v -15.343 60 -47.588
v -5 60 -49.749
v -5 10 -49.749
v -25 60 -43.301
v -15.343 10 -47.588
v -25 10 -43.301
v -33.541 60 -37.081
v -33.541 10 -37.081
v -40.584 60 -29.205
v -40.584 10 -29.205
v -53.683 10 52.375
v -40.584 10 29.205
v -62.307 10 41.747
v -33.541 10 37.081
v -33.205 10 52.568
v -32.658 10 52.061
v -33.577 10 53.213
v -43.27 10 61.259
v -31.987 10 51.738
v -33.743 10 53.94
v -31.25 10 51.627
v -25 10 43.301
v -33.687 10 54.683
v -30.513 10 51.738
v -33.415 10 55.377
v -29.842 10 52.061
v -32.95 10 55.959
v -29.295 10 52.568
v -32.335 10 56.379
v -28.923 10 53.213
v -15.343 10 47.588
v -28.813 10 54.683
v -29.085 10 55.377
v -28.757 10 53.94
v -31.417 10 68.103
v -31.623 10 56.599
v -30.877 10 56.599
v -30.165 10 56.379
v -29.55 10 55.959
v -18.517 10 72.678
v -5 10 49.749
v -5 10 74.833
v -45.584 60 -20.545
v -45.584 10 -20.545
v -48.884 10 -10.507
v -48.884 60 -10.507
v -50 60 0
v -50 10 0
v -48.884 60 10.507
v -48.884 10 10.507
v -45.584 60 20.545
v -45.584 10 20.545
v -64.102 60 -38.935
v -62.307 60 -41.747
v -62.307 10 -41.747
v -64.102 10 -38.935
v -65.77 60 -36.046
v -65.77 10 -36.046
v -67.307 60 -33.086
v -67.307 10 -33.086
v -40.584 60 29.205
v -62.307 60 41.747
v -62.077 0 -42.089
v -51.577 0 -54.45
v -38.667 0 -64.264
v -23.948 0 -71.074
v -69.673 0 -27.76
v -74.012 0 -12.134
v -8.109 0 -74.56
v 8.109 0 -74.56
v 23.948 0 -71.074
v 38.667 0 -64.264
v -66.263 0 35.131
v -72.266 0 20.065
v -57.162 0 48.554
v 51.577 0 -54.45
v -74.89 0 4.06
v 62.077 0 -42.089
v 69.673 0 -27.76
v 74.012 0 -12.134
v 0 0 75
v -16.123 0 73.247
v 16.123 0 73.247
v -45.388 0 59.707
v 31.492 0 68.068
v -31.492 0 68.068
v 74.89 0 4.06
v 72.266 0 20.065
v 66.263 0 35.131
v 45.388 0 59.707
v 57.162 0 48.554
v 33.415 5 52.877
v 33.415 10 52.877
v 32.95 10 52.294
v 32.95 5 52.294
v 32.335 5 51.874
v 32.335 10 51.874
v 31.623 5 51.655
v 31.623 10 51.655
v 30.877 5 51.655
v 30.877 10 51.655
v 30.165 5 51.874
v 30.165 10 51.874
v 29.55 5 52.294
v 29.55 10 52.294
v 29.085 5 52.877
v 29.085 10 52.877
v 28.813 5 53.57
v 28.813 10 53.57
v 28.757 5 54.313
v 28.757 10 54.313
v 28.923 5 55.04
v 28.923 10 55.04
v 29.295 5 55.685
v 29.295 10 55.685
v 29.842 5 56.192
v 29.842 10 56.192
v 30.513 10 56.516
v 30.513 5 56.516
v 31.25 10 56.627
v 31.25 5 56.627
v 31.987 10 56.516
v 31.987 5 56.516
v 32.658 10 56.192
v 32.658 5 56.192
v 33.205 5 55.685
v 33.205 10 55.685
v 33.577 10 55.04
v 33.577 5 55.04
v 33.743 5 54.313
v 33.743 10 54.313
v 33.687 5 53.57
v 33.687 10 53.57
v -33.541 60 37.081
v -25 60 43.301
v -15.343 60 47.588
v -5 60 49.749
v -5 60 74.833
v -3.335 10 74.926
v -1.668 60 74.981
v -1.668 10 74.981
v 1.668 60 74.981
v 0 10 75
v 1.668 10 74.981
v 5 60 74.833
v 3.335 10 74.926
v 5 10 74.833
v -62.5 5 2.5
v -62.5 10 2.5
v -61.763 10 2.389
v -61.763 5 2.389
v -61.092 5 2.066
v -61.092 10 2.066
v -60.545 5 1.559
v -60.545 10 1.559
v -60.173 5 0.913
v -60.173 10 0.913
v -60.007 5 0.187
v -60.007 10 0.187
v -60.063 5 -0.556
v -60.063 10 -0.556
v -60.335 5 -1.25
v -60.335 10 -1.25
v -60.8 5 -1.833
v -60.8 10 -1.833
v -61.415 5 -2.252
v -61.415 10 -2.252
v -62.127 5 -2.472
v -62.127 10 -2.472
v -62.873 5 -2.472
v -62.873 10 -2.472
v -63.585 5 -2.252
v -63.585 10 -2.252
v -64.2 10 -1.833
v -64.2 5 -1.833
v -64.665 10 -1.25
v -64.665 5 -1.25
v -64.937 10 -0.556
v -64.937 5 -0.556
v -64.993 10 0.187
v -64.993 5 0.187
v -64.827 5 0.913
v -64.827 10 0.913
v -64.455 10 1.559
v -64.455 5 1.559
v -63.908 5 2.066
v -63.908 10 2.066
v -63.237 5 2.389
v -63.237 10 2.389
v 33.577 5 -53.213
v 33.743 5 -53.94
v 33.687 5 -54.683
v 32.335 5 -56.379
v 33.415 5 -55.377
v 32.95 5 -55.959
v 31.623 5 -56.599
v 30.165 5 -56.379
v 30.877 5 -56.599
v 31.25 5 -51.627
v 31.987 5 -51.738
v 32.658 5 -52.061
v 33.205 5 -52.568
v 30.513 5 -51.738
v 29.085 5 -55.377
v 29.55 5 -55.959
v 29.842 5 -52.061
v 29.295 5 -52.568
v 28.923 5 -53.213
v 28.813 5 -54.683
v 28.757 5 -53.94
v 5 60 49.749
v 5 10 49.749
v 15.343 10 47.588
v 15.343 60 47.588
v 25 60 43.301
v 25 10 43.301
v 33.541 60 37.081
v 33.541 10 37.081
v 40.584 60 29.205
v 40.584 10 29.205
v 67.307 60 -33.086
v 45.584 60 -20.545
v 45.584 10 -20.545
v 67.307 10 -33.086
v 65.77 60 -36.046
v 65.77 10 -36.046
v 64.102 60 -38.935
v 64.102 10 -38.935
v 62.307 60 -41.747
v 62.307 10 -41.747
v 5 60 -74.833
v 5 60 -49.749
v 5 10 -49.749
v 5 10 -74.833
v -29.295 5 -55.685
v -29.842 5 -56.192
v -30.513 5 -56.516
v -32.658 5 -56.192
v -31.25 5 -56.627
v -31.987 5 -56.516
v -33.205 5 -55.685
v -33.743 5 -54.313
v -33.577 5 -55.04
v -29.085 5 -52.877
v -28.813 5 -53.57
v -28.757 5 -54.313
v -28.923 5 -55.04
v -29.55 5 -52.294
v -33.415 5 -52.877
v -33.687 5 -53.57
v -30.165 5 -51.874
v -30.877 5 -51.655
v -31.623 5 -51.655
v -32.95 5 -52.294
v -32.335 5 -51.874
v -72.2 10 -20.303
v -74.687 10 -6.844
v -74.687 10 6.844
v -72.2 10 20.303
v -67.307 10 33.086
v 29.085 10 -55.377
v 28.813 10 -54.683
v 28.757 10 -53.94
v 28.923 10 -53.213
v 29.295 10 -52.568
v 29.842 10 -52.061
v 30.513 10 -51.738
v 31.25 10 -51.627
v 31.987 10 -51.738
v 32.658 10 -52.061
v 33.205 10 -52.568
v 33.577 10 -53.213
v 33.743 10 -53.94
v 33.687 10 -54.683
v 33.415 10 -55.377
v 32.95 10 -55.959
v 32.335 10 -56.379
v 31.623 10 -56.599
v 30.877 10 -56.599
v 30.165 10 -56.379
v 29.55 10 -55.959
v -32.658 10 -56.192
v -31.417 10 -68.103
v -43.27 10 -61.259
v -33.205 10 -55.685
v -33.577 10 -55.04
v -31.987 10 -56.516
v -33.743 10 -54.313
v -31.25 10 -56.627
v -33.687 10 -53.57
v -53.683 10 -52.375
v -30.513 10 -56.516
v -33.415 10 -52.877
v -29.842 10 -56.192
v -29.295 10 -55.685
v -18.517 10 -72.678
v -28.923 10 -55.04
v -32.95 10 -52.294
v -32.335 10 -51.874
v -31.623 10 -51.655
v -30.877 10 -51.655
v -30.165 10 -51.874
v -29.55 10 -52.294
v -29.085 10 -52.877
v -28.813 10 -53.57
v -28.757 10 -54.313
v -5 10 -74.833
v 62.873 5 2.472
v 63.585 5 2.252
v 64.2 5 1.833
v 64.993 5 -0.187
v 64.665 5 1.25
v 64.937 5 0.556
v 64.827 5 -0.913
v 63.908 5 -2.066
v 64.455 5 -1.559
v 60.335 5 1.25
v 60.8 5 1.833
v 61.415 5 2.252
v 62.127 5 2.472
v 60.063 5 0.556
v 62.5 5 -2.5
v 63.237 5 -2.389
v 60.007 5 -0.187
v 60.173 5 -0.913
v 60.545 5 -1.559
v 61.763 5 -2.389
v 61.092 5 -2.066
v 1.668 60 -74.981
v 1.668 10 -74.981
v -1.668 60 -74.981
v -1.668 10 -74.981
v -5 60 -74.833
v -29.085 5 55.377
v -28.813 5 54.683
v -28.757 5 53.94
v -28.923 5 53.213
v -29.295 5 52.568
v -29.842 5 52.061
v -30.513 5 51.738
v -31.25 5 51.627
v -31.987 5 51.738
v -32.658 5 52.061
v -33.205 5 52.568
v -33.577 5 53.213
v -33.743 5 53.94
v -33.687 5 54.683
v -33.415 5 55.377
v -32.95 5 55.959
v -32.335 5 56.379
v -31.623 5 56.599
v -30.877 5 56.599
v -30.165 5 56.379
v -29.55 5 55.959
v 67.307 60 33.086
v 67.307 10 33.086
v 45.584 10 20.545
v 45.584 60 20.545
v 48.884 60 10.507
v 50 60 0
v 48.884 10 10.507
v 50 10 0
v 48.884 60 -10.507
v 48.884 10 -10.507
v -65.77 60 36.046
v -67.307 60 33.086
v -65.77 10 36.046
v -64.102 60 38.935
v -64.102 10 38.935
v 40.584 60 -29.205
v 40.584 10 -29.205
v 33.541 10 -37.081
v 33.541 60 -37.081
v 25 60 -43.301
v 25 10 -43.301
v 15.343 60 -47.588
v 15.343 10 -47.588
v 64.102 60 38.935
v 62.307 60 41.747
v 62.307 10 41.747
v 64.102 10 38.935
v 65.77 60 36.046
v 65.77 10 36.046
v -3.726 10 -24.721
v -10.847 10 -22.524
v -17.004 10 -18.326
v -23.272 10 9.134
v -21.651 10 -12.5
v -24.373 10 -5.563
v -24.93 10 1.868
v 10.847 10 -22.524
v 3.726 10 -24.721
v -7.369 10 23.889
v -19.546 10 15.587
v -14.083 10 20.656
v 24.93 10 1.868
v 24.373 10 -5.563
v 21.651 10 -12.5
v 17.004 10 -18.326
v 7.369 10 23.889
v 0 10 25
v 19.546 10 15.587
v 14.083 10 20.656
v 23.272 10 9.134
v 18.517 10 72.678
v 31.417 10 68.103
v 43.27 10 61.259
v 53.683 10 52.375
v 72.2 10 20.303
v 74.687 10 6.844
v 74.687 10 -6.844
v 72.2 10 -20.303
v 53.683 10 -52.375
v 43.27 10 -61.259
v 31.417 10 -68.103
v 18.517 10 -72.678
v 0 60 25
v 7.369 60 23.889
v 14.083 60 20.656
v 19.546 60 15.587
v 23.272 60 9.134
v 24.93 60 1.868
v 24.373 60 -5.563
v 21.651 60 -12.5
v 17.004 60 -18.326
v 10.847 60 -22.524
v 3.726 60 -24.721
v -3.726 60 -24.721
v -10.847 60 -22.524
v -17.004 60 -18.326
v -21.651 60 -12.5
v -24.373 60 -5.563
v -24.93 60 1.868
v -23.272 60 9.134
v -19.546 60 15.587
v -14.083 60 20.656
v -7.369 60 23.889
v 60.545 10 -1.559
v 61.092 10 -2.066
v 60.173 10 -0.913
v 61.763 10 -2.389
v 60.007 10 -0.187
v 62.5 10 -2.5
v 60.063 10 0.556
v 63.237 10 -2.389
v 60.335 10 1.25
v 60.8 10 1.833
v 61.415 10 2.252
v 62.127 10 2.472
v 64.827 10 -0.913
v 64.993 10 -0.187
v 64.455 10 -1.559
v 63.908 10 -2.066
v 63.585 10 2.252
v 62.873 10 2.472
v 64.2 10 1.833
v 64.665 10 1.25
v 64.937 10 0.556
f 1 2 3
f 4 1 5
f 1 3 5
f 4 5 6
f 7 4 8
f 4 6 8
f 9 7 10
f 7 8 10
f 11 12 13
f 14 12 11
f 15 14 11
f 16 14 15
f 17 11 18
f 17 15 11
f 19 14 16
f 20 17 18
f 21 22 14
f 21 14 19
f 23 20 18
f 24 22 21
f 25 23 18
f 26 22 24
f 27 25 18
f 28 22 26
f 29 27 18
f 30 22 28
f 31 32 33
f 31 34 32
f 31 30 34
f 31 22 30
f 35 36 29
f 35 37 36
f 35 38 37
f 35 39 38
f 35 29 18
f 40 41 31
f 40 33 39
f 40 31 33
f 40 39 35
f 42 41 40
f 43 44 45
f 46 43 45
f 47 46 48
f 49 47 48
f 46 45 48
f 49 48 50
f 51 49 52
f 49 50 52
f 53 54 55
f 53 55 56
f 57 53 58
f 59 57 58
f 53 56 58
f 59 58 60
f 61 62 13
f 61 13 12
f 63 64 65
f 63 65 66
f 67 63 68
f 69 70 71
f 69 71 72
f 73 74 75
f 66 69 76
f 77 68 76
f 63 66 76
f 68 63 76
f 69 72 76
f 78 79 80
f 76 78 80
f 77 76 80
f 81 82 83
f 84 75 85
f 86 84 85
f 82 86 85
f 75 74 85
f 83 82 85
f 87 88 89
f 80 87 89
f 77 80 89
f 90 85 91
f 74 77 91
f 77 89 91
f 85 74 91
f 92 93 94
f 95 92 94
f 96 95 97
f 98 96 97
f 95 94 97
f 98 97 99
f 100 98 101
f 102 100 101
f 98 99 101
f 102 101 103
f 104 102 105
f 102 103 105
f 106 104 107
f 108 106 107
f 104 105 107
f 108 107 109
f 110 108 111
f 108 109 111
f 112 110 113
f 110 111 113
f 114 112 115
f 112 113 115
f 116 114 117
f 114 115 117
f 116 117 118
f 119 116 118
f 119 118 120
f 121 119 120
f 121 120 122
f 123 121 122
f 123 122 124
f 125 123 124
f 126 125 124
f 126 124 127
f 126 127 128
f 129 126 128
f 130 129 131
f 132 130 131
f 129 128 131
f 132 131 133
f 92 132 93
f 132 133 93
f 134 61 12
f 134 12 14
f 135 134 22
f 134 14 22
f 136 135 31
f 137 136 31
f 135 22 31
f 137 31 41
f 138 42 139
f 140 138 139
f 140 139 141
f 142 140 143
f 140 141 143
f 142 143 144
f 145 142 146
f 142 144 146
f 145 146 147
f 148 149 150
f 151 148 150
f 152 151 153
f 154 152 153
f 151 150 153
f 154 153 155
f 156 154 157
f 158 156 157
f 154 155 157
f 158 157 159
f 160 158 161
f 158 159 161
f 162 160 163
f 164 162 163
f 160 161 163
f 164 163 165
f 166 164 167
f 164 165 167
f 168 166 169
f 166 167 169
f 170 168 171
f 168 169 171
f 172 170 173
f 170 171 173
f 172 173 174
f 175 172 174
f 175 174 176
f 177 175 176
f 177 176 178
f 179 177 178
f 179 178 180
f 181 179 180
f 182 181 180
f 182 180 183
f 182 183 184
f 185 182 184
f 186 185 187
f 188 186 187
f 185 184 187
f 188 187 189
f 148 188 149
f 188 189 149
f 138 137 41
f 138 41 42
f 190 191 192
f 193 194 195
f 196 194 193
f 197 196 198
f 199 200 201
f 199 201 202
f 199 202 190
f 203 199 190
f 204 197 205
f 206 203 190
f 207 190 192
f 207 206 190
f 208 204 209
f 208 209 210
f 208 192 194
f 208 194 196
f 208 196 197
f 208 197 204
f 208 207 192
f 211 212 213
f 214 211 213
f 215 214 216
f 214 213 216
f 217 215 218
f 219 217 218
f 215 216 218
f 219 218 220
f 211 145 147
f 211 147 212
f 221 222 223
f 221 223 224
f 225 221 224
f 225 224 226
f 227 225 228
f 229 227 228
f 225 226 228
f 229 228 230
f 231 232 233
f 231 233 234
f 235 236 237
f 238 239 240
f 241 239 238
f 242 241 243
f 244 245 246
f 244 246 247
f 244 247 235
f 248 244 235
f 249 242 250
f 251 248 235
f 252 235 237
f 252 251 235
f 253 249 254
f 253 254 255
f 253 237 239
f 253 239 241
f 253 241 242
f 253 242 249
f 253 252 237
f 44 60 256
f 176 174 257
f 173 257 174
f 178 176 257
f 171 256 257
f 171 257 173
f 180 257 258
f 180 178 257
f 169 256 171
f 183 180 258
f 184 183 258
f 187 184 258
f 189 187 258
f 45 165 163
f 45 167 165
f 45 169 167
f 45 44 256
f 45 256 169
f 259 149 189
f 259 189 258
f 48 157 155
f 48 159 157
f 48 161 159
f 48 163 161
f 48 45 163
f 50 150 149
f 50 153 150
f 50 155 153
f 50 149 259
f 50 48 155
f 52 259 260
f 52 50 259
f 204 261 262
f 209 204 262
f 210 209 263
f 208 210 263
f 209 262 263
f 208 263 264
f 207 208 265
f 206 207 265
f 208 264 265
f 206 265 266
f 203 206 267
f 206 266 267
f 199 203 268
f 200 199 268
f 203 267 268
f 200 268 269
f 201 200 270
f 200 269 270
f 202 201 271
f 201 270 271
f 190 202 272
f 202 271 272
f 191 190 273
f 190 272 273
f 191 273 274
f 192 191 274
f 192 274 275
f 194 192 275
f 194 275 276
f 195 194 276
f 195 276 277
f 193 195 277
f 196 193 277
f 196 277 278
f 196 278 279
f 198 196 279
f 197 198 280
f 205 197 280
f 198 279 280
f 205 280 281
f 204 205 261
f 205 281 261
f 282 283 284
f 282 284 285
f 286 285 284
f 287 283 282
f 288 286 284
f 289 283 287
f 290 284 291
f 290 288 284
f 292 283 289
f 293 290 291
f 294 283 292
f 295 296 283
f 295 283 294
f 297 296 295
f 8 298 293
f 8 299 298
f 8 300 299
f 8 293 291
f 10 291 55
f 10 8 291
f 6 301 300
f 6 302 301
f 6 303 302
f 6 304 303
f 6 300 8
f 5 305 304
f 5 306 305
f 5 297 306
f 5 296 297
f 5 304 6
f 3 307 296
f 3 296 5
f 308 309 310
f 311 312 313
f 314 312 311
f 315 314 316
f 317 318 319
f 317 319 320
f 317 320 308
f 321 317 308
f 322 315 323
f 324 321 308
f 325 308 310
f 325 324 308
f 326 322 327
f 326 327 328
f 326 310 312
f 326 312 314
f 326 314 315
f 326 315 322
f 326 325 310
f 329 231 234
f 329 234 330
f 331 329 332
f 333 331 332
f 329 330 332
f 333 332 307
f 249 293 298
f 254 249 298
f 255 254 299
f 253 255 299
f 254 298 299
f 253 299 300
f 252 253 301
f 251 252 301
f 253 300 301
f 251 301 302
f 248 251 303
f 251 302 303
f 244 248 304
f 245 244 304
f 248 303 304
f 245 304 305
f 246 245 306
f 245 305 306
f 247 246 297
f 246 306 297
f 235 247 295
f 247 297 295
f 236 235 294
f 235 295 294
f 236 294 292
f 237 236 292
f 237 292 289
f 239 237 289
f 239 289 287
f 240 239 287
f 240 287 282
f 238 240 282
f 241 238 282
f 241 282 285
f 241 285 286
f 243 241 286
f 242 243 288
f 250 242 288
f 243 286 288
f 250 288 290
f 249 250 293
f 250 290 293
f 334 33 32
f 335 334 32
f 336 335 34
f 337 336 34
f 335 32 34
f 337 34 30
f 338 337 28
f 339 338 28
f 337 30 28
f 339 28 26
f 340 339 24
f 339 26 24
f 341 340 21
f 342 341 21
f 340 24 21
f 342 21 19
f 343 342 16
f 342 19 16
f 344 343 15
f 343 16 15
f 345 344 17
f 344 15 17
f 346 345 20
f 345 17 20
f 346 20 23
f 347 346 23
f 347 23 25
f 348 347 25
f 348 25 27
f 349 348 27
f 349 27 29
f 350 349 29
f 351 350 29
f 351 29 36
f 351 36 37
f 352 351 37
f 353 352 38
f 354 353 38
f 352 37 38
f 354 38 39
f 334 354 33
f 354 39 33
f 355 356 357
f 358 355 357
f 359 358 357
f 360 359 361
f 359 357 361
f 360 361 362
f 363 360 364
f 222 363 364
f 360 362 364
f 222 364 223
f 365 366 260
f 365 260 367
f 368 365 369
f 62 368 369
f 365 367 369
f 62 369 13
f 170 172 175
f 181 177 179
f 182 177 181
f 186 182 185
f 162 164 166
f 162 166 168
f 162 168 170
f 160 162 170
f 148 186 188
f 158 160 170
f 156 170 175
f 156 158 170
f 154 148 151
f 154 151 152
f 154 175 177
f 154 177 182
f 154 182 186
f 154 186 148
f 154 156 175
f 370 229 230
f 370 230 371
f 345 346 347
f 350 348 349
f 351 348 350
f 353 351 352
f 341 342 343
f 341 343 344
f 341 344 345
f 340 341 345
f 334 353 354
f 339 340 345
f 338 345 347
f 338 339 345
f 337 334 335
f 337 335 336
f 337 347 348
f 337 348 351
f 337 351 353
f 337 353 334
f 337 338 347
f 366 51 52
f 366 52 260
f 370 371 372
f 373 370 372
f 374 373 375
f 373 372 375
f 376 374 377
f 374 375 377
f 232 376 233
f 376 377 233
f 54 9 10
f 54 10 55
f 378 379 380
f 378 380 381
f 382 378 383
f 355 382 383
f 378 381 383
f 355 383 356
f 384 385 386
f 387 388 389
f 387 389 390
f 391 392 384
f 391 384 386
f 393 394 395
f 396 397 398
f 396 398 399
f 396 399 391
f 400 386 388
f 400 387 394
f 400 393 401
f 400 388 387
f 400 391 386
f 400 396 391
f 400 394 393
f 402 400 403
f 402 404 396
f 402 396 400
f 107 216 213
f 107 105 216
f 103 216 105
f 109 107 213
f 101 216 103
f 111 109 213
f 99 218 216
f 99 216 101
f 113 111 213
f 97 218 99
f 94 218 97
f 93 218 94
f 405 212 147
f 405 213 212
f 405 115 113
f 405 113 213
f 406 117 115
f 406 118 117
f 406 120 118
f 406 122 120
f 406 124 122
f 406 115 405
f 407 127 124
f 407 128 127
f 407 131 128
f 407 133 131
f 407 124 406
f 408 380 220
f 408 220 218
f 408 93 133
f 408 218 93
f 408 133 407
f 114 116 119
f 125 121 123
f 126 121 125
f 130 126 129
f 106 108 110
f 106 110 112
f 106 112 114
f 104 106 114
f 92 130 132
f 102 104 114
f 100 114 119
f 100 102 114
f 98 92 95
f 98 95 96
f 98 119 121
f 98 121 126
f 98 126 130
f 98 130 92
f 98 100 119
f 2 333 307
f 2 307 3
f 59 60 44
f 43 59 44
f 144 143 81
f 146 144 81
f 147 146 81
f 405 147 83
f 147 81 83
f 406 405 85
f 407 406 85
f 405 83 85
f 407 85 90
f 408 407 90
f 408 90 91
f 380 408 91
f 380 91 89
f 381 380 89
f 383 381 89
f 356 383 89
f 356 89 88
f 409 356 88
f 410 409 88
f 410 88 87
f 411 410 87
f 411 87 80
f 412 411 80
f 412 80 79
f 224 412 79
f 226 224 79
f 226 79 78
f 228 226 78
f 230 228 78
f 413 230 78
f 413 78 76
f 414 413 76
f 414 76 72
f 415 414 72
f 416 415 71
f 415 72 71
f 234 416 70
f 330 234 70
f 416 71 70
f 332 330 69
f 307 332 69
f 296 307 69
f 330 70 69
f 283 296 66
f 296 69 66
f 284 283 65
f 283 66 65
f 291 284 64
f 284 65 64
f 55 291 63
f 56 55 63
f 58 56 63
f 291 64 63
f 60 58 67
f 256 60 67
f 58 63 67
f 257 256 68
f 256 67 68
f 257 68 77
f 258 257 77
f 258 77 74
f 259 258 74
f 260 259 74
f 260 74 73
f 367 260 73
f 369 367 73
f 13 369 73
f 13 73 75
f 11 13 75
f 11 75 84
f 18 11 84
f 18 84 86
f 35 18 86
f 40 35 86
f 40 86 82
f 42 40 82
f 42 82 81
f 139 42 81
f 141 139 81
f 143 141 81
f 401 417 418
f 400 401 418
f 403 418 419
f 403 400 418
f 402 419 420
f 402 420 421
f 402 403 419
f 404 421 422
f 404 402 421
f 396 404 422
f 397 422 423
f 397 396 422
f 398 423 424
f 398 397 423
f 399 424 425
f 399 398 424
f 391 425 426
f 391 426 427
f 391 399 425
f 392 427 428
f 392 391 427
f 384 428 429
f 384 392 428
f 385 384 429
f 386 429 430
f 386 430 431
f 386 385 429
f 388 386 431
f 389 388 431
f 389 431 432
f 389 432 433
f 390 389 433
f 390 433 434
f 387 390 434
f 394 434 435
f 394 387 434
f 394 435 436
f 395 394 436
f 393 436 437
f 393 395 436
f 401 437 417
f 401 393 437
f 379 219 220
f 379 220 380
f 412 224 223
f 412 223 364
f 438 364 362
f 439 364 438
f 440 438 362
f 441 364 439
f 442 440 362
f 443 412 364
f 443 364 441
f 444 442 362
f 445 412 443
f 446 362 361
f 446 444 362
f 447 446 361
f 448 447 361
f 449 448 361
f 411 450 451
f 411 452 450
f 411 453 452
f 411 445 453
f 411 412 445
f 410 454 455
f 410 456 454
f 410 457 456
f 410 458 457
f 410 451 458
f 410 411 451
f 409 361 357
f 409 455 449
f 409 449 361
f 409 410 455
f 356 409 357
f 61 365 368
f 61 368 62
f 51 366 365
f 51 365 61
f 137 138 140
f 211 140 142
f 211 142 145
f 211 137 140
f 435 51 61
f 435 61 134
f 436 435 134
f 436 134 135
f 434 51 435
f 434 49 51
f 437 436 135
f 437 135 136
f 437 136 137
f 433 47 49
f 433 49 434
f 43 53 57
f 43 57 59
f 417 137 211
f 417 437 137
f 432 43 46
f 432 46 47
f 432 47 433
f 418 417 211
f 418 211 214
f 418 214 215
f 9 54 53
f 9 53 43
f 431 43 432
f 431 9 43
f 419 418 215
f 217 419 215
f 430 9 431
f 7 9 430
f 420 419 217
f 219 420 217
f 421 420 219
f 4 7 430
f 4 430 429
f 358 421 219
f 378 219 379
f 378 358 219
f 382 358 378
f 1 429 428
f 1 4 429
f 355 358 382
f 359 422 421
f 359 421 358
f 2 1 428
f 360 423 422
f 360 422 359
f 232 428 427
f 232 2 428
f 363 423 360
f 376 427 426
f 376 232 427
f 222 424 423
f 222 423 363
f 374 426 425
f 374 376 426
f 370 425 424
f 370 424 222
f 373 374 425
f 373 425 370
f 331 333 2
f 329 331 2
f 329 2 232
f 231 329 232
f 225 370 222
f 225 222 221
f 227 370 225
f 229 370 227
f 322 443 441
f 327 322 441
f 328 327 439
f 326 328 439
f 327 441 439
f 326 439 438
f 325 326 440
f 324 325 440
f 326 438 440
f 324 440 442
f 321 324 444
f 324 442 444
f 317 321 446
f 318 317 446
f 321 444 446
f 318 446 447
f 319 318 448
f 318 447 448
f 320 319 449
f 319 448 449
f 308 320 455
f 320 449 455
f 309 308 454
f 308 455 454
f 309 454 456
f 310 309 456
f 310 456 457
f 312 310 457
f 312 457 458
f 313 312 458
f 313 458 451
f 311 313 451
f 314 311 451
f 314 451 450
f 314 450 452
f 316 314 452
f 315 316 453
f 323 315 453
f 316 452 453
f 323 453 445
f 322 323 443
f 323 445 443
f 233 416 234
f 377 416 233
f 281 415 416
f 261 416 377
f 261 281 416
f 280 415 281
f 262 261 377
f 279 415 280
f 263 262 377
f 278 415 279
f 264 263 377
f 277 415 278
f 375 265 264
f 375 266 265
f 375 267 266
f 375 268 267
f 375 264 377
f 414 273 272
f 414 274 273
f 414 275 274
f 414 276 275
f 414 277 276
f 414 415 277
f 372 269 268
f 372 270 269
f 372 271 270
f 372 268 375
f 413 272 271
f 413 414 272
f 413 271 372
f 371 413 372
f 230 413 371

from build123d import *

# Parameters (mm, degrees)
SKETCH1_R           = 75
BOSS_EXTRUDE1_DEPTH = 10
SKETCH2_R           = 50
SKETCH2_R_2         = 25
BOSS_EXTRUDE2_DEPTH = 50
BOSS_EXTRUDE4_DEPTH = 50
CIRPATTERN2_COUNT   = 6
SKETCH5_R           = 2.5
CUT_EXTRUDE5_DEPTH  = 5
CIRPATTERN3_COUNT   = 6


with BuildPart() as part:
    # Sketch1 → Boss-Extrude1 (new body)
    with BuildSketch(Plane(origin=(0, 0, 0), x_dir=(1, 0, 0), z_dir=(0, 1, 0))):
        with Locations(Location((0, 0, 0), (0, 0, 270))):
            Circle(SKETCH1_R)
    extrude(amount=BOSS_EXTRUDE1_DEPTH)

    # Sketch2 → Boss-Extrude2 (add)
    with BuildSketch(Plane(origin=(0, 10, 0), x_dir=(1, 0, 0), z_dir=(0, 1, 0))):
        with Locations(Location((0, 0, 0), (0, 0, 270))):
            Circle(SKETCH2_R)
        with Locations(Location((0, 0, 0), (0, 0, 270))):
            Circle(SKETCH2_R_2, mode=Mode.SUBTRACT)
    extrude(amount=BOSS_EXTRUDE2_DEPTH)

    # Sketch3 → Boss-Extrude4 (add)
    with BuildSketch(Plane(origin=(0, 10, 0), x_dir=(1, 0, 0), z_dir=(0, 1, 0))):
        with BuildLine():
            ThreePointArc((5, 74.833147735), (0, 75), (-5, 74.833147735))
            Line((-5, 74.833147735), (-5, 49.749371855))
            ThreePointArc((-5, 49.749371855), (0, 50), (5, 49.749371855))
            Line((5, 49.749371855), (5, 74.833147735))
        make_face()
        with BuildLine():
            Line((5, -74.833147735), (5, -49.749371855))
            ThreePointArc((5, -49.749371855), (0, -50), (-5, -49.749371855))
            Line((-5, -49.749371855), (-5, -74.833147735))
            ThreePointArc((-5, -74.833147735), (0, -75), (5, -74.833147735))
        make_face()
    boss_extrude4 = extrude(amount=BOSS_EXTRUDE4_DEPTH)

    # CirPattern2: Boss-Extrude4 ×6 about axis
    cirpattern2_axis = Axis((0, 0, 0), (0, 1, 0))
    for i in range(1, CIRPATTERN2_COUNT):
        add(boss_extrude4.rotate(cirpattern2_axis, i * 360 / CIRPATTERN2_COUNT))

    # Sketch5 → Cut-Extrude5 (cut)
    with BuildSketch(Plane(origin=(0, 10, 0), x_dir=(1, 0, 0), z_dir=(0, 1, 0))):
        with Locations(Location((-62.5, 0, 0), (0, 0, 270))):
            Circle(SKETCH5_R)
    cut_extrude5 = extrude(amount=-CUT_EXTRUDE5_DEPTH, mode=Mode.SUBTRACT)

    # CirPattern3: Cut-Extrude5 ×6 about axis
    cirpattern3_axis = Axis((0, 0, 0), (0, 1, 0))
    for i in range(1, CIRPATTERN3_COUNT):
        add(cut_extrude5.rotate(cirpattern3_axis, i * 360 / CIRPATTERN3_COUNT), mode=Mode.SUBTRACT)


solid = part.part
